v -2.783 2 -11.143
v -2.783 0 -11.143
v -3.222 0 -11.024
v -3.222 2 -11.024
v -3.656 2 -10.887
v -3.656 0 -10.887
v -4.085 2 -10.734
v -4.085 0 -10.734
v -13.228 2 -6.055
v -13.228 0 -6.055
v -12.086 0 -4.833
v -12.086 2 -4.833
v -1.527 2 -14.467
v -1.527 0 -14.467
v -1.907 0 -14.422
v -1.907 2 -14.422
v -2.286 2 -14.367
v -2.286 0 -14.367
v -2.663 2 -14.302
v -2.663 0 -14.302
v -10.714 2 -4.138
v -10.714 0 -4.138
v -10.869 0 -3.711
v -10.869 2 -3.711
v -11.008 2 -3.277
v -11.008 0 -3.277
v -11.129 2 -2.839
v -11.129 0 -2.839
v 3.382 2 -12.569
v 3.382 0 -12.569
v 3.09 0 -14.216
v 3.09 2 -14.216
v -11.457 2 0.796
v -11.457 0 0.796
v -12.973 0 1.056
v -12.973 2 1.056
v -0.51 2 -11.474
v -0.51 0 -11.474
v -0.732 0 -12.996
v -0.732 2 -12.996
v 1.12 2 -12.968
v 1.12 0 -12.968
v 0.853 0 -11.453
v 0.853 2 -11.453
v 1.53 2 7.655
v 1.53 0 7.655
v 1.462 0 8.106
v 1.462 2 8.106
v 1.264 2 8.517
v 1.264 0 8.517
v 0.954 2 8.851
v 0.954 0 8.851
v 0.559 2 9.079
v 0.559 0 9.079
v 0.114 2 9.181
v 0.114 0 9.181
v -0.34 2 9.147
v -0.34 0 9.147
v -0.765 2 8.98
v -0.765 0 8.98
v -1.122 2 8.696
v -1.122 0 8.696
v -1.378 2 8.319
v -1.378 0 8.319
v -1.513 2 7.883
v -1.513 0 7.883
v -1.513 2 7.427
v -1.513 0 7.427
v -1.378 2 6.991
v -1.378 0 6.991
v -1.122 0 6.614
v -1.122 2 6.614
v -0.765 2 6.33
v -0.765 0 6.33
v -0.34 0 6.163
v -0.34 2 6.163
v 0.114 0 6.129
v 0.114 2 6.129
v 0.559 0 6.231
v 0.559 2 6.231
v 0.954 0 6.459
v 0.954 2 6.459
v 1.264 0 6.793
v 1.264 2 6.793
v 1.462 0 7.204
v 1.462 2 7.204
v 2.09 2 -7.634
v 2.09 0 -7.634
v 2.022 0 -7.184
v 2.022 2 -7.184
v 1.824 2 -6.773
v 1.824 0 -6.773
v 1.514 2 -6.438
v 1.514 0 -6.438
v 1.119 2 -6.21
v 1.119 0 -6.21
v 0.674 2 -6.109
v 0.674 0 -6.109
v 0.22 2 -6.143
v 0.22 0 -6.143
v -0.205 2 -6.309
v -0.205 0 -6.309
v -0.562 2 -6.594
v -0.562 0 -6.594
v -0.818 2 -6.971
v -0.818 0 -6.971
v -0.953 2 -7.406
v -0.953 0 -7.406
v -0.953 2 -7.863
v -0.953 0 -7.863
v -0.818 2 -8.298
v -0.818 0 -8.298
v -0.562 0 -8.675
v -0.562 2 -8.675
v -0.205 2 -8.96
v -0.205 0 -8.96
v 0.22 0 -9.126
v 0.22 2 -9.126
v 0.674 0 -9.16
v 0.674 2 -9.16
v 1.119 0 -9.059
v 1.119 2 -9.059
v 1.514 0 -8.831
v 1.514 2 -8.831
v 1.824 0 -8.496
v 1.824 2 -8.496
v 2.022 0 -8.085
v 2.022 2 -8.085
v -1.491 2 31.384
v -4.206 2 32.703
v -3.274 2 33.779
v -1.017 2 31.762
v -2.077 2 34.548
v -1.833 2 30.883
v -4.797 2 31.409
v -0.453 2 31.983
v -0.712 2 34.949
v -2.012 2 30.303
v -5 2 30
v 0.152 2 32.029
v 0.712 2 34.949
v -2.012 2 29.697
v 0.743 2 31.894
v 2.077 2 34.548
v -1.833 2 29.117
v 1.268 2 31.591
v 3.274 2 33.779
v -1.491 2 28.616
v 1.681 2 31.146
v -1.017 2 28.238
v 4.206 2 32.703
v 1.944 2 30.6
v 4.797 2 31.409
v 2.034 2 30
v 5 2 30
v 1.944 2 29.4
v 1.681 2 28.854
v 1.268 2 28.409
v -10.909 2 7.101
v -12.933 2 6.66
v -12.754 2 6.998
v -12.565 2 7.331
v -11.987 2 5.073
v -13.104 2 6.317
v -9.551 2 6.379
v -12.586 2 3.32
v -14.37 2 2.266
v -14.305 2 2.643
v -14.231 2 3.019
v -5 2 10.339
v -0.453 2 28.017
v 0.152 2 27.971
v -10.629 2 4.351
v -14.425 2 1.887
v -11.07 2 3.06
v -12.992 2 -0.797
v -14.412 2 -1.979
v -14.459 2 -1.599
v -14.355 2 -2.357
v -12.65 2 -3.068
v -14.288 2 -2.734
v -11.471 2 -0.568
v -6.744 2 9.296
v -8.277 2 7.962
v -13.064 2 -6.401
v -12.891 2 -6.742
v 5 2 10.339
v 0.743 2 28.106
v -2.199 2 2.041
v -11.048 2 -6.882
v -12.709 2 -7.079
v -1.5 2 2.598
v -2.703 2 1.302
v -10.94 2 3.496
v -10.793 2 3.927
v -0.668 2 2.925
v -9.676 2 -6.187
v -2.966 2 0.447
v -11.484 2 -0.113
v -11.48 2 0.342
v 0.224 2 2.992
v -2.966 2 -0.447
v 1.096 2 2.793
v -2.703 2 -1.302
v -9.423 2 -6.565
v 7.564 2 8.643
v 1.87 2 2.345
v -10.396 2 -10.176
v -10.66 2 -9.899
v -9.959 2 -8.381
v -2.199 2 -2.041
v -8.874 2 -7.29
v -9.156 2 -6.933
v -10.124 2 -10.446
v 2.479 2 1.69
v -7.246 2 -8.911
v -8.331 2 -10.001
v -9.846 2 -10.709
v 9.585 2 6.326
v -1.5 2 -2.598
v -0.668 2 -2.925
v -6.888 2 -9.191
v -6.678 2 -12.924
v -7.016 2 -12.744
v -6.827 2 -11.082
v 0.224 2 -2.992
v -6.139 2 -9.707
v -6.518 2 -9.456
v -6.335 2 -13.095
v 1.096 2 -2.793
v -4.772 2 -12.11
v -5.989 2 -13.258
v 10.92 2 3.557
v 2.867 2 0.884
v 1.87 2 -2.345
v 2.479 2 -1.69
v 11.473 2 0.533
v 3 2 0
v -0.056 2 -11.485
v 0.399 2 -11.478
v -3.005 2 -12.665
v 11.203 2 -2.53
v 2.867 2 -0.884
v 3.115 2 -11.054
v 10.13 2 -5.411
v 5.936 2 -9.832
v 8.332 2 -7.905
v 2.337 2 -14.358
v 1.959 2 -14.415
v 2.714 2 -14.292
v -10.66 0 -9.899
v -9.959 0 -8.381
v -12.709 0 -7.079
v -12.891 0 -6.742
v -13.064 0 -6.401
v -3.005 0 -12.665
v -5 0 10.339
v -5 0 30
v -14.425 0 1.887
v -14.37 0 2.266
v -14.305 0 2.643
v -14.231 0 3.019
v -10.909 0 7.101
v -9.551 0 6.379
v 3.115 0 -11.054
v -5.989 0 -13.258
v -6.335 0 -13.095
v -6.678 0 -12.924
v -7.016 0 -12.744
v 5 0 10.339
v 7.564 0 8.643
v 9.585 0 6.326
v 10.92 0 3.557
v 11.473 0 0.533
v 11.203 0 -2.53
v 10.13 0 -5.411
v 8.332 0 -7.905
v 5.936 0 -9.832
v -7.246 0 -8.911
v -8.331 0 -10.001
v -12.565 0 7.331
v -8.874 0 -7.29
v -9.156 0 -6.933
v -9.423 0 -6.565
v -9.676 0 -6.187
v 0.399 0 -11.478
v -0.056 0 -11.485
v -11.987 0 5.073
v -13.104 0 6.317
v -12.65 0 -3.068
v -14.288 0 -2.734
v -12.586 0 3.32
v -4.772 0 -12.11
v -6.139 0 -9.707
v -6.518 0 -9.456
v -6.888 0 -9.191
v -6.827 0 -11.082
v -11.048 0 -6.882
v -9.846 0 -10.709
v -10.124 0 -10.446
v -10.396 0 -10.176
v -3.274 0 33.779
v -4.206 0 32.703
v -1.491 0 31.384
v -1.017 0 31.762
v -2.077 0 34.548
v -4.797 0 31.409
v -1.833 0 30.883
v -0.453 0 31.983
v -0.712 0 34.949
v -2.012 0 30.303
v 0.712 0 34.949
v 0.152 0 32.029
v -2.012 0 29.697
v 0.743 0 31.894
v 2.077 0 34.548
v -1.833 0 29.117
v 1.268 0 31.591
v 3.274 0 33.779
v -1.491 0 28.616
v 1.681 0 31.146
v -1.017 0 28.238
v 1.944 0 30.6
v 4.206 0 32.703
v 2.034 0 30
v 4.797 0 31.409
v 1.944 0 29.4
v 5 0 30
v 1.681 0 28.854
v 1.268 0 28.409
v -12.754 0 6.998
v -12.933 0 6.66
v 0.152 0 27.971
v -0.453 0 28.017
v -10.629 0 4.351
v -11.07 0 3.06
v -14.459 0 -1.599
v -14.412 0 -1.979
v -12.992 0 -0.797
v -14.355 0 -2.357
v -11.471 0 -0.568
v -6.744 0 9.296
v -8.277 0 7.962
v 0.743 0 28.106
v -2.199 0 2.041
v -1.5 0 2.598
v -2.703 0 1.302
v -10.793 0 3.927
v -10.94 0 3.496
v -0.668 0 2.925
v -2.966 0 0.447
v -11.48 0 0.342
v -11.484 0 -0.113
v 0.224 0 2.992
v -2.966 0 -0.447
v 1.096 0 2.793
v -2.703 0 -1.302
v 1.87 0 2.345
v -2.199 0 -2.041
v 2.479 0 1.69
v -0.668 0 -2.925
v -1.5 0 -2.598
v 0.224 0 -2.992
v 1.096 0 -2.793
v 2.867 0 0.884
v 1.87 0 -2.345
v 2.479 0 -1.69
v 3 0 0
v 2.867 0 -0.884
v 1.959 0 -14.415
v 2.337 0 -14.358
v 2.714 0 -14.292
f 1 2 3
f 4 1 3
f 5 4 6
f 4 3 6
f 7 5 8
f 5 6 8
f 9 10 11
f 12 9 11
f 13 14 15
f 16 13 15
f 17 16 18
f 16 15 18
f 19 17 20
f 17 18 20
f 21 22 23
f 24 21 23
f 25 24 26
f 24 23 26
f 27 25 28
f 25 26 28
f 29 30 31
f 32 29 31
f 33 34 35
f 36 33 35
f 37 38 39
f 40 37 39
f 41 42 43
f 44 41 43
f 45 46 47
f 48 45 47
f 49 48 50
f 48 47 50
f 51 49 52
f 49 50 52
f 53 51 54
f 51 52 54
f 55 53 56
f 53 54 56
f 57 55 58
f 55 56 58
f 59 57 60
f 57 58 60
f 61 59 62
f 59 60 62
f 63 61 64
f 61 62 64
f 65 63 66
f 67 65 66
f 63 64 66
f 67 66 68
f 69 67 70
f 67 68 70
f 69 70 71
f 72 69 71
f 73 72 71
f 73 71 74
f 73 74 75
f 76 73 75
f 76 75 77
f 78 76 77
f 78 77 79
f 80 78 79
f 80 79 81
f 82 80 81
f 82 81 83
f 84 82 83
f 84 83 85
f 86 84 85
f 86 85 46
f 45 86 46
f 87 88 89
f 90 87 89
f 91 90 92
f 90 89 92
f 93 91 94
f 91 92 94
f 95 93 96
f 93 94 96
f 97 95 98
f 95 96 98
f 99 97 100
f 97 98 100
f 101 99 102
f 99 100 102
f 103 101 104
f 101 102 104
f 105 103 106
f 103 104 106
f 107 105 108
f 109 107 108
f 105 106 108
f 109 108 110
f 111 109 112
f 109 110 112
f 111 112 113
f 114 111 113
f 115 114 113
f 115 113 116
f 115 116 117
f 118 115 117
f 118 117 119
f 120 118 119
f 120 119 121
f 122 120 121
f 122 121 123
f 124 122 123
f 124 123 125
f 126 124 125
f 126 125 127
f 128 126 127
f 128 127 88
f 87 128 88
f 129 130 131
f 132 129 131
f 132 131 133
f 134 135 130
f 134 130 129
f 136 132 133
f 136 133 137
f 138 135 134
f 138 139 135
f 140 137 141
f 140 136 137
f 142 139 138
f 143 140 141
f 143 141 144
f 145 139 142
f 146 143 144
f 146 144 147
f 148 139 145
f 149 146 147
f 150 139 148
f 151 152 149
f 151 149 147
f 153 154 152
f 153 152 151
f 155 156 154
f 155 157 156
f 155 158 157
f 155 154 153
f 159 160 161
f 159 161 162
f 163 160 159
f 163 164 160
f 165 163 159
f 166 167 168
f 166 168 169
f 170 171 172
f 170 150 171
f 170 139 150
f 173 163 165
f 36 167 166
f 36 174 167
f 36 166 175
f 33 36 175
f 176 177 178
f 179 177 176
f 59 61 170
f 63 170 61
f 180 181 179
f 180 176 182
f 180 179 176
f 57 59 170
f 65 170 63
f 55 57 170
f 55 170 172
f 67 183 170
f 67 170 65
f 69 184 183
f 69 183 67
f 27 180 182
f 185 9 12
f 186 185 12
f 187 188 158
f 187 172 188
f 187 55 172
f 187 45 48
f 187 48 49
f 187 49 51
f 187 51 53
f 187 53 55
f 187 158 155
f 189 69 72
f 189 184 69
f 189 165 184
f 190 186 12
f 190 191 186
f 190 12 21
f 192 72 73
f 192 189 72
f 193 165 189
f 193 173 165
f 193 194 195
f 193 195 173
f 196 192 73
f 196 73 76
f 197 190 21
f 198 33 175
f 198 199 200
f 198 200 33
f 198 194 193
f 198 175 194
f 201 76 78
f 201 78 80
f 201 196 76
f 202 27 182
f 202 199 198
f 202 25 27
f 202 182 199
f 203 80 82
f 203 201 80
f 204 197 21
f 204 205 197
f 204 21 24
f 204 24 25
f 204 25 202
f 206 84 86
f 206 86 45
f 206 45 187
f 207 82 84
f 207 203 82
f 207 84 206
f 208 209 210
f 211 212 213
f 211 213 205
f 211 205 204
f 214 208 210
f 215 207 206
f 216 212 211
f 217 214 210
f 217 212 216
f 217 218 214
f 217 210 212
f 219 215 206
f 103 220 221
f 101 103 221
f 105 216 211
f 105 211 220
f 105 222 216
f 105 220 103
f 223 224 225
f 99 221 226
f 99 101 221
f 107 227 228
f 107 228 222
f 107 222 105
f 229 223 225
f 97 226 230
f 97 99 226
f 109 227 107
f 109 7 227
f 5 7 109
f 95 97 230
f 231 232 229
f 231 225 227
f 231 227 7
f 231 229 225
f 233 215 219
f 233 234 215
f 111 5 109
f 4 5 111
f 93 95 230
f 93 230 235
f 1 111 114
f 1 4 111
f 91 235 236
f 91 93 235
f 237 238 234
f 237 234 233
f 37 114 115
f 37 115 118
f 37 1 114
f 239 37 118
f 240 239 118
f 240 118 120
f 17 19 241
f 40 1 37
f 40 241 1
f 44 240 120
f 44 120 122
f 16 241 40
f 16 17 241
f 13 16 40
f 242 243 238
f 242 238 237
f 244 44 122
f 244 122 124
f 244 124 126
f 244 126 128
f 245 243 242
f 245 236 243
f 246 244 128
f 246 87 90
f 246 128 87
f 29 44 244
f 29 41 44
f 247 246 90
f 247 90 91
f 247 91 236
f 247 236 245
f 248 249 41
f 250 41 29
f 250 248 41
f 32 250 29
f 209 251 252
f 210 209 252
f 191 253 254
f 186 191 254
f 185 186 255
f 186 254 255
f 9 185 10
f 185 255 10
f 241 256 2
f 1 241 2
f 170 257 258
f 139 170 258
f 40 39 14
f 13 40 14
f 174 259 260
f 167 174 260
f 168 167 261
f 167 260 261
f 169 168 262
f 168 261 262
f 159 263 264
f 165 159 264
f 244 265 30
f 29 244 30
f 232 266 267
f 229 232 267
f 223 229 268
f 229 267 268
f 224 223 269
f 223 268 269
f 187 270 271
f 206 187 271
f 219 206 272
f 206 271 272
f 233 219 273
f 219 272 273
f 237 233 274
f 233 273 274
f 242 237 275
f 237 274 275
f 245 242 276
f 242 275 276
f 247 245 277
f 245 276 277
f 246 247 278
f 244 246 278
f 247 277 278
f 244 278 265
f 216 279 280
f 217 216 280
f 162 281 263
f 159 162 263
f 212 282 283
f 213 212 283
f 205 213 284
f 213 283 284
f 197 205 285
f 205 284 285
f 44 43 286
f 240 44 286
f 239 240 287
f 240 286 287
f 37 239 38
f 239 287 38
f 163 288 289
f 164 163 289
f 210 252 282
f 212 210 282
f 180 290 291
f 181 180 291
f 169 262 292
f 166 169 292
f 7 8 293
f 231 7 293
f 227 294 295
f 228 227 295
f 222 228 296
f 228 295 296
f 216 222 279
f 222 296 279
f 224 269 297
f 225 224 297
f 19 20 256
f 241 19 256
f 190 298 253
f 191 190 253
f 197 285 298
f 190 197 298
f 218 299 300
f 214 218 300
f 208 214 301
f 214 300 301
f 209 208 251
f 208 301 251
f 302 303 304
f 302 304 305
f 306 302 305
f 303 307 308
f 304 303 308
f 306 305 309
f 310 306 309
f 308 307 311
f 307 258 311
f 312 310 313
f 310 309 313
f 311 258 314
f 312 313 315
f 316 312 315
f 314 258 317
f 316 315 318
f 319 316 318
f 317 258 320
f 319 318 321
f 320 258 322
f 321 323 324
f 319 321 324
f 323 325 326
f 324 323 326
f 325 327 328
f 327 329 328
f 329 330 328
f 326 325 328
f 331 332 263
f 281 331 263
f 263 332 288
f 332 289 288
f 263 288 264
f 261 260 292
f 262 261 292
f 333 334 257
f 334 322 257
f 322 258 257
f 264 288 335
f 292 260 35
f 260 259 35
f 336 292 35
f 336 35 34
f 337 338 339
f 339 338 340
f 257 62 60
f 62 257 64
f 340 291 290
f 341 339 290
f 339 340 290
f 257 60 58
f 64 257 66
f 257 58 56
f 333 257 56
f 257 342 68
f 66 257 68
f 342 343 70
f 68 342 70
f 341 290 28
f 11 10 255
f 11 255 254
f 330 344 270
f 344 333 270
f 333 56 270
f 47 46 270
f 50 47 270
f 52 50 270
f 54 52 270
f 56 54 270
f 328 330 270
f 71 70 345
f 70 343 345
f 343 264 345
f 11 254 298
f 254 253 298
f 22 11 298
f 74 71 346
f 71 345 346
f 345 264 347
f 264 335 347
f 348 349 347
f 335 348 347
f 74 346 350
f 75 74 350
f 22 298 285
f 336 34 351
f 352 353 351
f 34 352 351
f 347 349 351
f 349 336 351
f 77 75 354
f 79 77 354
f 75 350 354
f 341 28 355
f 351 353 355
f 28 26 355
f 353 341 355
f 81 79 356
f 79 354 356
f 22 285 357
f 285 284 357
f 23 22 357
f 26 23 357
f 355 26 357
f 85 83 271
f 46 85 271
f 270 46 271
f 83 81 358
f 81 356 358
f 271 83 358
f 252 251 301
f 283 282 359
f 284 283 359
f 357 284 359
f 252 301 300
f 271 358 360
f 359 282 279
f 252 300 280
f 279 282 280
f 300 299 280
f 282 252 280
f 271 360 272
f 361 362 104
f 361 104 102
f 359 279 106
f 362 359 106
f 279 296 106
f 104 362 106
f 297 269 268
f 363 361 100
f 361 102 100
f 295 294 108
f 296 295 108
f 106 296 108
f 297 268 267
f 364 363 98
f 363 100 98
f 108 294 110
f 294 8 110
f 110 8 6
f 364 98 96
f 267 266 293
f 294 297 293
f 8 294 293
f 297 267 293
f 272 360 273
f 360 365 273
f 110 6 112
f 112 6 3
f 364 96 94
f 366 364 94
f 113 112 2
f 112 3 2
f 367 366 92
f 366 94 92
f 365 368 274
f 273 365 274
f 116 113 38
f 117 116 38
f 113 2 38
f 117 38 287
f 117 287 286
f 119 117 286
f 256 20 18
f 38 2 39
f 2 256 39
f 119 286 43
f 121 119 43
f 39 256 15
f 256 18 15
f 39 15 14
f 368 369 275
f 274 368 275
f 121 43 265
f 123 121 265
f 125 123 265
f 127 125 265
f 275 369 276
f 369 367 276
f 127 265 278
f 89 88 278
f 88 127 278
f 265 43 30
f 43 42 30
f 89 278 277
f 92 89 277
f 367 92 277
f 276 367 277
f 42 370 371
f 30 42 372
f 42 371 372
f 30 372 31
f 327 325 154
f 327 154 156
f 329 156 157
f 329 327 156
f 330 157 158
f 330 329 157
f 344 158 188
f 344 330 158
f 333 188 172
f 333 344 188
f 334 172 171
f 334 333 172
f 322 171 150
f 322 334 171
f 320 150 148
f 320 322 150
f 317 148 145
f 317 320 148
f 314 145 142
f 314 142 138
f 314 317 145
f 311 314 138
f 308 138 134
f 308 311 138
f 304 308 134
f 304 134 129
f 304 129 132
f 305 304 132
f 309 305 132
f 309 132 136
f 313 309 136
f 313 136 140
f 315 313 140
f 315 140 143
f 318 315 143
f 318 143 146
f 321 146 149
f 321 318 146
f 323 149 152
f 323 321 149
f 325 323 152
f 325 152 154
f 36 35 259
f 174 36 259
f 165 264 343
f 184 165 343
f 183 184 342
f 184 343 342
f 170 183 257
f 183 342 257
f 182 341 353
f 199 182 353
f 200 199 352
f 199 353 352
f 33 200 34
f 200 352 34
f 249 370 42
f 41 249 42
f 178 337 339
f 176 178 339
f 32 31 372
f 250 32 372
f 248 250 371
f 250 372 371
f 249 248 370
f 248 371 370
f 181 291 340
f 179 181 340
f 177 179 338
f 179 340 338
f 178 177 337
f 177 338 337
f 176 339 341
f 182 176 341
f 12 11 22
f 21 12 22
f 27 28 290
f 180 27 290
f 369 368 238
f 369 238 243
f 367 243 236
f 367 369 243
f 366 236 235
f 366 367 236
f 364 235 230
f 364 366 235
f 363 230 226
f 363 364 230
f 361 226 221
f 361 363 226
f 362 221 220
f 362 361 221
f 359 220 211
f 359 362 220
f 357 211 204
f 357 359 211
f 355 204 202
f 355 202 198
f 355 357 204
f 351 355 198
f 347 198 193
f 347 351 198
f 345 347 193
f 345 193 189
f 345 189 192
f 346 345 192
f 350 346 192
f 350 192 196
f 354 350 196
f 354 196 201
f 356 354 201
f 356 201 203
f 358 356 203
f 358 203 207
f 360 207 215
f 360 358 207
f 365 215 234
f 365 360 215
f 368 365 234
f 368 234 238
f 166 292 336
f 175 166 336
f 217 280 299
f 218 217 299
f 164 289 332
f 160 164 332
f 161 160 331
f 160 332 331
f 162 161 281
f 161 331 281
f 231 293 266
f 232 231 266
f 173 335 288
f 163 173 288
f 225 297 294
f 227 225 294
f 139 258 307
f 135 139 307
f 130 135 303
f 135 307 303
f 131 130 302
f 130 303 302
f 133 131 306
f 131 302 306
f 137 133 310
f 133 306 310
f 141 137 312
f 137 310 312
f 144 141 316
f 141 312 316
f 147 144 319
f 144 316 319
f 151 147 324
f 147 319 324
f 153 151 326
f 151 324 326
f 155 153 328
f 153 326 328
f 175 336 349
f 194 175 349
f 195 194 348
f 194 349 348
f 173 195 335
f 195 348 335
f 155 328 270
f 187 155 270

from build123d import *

# Parameters (mm, degrees)
CROQUIS1_R              = 2.034348523
CROQUIS1_R_2            = 3
SALIENTE_EXTRUIR1_DEPTH = 2
SALIENTE_EXTRUIR2_DEPTH = 2
MATRIZC1_COUNT          = 8
MATRIZC1_ANGLE          = 128
CROQUIS4_R              = 1.53
CORTAR_EXTRUIR1_DEPTH   = 10


with BuildPart() as part:
    # Croquis1 → Saliente-Extruir1 (new body)
    with BuildSketch(Plane(origin=(0, 0, 0), x_dir=(1, 0, 0), z_dir=(0, 1, 0))):
        with BuildLine():
            Line((-5, -10.339498295), (-5, -30))
            ThreePointArc((-5, -30), (0, -35), (5, -30))
            Line((5, -30), (5, -10.339498295))
            ThreePointArc((5, -10.339498295), (0, 11.485), (-5, -10.339498295))
        make_face()
        with Locations((0, -30)):
            Circle(CROQUIS1_R, mode=Mode.SUBTRACT)
        Circle(CROQUIS1_R_2, mode=Mode.SUBTRACT)
    extrude(amount=SALIENTE_EXTRUIR1_DEPTH)

    # Croquis3 → Saliente-Extruir2 (add)
    with BuildSketch(Plane(origin=(0, 0, 0), x_dir=(1, 0, 0), z_dir=(0, 1, 0))):
        with BuildLine():
            Line((1.120443051, 12.967936283), (0.853363456, 11.45325263))
            ThreePointArc((0.853363456, 11.45325263), (1.994349321, 11.310517043), (3.115343764, 11.054404472))
            Line((3.115343764, 11.054404472), (3.382423359, 12.569088125))
            Line((3.382423359, 12.569088125), (3.089673258, 14.215613789))
            ThreePointArc((3.089673258, 14.215613789), (2.526146865, 14.326490787), (1.958683104, 14.415037868))
            Line((1.958683104, 14.415037868), (1.120443051, 12.967936283))
        make_face()
    saliente_extruir2 = extrude(amount=SALIENTE_EXTRUIR2_DEPTH)

    # MatrizC1: Saliente-Extruir2 ×8 about axis
    matrizc1_axis = Axis((0, 0, 0), (0, 1, 0))
    for i in range(1, MATRIZC1_COUNT):
        add(saliente_extruir2.rotate(matrizc1_axis, i * MATRIZC1_ANGLE / (MATRIZC1_COUNT - 1)))

    # Croquis4 → Cortar-Extruir1 (cut)
    with BuildSketch(Plane.XZ):
        with Locations((0.559982615, -7.634490453)):
            Circle(CROQUIS4_R)
        with Locations((0, 7.655)):
            Circle(CROQUIS4_R)
    extrude(amount=-CORTAR_EXTRUIR1_DEPTH, mode=Mode.SUBTRACT)


solid = part.part
